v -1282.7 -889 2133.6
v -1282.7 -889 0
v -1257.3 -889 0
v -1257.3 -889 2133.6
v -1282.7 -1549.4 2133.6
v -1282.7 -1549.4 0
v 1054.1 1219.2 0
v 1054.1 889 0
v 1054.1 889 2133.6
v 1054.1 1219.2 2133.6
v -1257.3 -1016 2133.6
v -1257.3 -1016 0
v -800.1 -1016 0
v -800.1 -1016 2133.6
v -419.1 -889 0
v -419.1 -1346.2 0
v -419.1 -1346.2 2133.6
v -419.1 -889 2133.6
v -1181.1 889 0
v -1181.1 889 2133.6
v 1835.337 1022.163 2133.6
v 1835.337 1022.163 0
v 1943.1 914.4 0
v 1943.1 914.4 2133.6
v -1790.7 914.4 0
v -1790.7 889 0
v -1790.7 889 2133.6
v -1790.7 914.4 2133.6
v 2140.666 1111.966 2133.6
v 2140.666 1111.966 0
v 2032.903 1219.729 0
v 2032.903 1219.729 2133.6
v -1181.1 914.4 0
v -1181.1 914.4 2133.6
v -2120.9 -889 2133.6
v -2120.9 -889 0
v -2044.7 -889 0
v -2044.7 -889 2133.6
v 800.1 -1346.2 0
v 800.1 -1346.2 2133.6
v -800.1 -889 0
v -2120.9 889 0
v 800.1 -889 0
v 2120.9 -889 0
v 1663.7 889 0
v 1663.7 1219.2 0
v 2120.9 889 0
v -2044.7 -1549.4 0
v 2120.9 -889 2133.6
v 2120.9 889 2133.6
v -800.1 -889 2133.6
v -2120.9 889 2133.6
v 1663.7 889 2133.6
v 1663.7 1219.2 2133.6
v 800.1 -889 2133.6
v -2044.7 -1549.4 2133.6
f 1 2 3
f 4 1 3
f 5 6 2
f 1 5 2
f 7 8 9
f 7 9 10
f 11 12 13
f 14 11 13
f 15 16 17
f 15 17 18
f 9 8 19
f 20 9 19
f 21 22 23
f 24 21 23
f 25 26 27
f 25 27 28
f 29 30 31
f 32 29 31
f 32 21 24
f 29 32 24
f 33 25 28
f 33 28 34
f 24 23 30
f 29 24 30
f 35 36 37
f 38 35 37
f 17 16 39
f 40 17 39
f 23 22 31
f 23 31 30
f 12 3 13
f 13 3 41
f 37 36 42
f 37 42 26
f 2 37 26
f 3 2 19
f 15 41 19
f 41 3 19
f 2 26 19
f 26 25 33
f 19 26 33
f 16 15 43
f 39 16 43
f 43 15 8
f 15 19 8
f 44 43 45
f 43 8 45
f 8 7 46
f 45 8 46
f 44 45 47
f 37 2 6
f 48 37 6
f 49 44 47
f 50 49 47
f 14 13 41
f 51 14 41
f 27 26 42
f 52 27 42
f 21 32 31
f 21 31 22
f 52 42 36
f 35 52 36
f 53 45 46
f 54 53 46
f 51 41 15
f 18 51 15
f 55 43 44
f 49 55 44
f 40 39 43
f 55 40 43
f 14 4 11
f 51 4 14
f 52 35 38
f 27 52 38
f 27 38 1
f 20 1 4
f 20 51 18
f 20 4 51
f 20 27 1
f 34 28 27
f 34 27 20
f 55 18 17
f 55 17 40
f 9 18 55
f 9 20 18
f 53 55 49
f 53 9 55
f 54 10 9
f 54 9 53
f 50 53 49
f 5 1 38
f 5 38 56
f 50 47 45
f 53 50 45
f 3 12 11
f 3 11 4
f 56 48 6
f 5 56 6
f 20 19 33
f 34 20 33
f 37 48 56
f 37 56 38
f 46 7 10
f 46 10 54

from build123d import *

# Parameters (mm, degrees)
F0_W     = 609.6
F0_H     = 25.4
F0_H_2   = 330.2
F0_W_2   = 1219.2
F0_H_3   = 457.2
F0_W_3   = 762
F0_H_4   = 660.4
F0_W_4   = 457.2
F0_H_5   = 127
F1_DEPTH = 2133.6


with BuildPart() as f1:
    # F0 (on Top) → F1 (new body)
    with BuildSketch(Plane.XY):
        Polygon((-1790.7, 889), (-2120.9, 889), (-2120.9, -889), (-2044.7, -889), (-1282.7, -889), (-1257.3, -889), (-800.1, -889), (-419.1, -889), (800.1, -889), (2120.9, -889), (2120.9, 889), (1663.7, 889), (1054.1, 889), (-1181.1, 889), align=None)
        with Locations((-1485.9, 901.7)):
            Rectangle(F0_W, F0_H)
        with Locations((1358.9, 1054.1)):
            Rectangle(F0_W, F0_H_2)
        with Locations((190.5, -1117.6)):
            Rectangle(F0_W_2, F0_H_3)
        with Locations((-1663.7, -1219.2)):
            Rectangle(F0_W_3, F0_H_4)
        with Locations((-1028.7, -952.5)):
            Rectangle(F0_W_4, F0_H_5)
        Polygon((2032.902561, 1219.728708), (1835.336927, 1022.163073), (1943.1, 914.4), (2140.665635, 1111.965635), align=None)
    extrude(amount=F1_DEPTH)


solid = f1.part
